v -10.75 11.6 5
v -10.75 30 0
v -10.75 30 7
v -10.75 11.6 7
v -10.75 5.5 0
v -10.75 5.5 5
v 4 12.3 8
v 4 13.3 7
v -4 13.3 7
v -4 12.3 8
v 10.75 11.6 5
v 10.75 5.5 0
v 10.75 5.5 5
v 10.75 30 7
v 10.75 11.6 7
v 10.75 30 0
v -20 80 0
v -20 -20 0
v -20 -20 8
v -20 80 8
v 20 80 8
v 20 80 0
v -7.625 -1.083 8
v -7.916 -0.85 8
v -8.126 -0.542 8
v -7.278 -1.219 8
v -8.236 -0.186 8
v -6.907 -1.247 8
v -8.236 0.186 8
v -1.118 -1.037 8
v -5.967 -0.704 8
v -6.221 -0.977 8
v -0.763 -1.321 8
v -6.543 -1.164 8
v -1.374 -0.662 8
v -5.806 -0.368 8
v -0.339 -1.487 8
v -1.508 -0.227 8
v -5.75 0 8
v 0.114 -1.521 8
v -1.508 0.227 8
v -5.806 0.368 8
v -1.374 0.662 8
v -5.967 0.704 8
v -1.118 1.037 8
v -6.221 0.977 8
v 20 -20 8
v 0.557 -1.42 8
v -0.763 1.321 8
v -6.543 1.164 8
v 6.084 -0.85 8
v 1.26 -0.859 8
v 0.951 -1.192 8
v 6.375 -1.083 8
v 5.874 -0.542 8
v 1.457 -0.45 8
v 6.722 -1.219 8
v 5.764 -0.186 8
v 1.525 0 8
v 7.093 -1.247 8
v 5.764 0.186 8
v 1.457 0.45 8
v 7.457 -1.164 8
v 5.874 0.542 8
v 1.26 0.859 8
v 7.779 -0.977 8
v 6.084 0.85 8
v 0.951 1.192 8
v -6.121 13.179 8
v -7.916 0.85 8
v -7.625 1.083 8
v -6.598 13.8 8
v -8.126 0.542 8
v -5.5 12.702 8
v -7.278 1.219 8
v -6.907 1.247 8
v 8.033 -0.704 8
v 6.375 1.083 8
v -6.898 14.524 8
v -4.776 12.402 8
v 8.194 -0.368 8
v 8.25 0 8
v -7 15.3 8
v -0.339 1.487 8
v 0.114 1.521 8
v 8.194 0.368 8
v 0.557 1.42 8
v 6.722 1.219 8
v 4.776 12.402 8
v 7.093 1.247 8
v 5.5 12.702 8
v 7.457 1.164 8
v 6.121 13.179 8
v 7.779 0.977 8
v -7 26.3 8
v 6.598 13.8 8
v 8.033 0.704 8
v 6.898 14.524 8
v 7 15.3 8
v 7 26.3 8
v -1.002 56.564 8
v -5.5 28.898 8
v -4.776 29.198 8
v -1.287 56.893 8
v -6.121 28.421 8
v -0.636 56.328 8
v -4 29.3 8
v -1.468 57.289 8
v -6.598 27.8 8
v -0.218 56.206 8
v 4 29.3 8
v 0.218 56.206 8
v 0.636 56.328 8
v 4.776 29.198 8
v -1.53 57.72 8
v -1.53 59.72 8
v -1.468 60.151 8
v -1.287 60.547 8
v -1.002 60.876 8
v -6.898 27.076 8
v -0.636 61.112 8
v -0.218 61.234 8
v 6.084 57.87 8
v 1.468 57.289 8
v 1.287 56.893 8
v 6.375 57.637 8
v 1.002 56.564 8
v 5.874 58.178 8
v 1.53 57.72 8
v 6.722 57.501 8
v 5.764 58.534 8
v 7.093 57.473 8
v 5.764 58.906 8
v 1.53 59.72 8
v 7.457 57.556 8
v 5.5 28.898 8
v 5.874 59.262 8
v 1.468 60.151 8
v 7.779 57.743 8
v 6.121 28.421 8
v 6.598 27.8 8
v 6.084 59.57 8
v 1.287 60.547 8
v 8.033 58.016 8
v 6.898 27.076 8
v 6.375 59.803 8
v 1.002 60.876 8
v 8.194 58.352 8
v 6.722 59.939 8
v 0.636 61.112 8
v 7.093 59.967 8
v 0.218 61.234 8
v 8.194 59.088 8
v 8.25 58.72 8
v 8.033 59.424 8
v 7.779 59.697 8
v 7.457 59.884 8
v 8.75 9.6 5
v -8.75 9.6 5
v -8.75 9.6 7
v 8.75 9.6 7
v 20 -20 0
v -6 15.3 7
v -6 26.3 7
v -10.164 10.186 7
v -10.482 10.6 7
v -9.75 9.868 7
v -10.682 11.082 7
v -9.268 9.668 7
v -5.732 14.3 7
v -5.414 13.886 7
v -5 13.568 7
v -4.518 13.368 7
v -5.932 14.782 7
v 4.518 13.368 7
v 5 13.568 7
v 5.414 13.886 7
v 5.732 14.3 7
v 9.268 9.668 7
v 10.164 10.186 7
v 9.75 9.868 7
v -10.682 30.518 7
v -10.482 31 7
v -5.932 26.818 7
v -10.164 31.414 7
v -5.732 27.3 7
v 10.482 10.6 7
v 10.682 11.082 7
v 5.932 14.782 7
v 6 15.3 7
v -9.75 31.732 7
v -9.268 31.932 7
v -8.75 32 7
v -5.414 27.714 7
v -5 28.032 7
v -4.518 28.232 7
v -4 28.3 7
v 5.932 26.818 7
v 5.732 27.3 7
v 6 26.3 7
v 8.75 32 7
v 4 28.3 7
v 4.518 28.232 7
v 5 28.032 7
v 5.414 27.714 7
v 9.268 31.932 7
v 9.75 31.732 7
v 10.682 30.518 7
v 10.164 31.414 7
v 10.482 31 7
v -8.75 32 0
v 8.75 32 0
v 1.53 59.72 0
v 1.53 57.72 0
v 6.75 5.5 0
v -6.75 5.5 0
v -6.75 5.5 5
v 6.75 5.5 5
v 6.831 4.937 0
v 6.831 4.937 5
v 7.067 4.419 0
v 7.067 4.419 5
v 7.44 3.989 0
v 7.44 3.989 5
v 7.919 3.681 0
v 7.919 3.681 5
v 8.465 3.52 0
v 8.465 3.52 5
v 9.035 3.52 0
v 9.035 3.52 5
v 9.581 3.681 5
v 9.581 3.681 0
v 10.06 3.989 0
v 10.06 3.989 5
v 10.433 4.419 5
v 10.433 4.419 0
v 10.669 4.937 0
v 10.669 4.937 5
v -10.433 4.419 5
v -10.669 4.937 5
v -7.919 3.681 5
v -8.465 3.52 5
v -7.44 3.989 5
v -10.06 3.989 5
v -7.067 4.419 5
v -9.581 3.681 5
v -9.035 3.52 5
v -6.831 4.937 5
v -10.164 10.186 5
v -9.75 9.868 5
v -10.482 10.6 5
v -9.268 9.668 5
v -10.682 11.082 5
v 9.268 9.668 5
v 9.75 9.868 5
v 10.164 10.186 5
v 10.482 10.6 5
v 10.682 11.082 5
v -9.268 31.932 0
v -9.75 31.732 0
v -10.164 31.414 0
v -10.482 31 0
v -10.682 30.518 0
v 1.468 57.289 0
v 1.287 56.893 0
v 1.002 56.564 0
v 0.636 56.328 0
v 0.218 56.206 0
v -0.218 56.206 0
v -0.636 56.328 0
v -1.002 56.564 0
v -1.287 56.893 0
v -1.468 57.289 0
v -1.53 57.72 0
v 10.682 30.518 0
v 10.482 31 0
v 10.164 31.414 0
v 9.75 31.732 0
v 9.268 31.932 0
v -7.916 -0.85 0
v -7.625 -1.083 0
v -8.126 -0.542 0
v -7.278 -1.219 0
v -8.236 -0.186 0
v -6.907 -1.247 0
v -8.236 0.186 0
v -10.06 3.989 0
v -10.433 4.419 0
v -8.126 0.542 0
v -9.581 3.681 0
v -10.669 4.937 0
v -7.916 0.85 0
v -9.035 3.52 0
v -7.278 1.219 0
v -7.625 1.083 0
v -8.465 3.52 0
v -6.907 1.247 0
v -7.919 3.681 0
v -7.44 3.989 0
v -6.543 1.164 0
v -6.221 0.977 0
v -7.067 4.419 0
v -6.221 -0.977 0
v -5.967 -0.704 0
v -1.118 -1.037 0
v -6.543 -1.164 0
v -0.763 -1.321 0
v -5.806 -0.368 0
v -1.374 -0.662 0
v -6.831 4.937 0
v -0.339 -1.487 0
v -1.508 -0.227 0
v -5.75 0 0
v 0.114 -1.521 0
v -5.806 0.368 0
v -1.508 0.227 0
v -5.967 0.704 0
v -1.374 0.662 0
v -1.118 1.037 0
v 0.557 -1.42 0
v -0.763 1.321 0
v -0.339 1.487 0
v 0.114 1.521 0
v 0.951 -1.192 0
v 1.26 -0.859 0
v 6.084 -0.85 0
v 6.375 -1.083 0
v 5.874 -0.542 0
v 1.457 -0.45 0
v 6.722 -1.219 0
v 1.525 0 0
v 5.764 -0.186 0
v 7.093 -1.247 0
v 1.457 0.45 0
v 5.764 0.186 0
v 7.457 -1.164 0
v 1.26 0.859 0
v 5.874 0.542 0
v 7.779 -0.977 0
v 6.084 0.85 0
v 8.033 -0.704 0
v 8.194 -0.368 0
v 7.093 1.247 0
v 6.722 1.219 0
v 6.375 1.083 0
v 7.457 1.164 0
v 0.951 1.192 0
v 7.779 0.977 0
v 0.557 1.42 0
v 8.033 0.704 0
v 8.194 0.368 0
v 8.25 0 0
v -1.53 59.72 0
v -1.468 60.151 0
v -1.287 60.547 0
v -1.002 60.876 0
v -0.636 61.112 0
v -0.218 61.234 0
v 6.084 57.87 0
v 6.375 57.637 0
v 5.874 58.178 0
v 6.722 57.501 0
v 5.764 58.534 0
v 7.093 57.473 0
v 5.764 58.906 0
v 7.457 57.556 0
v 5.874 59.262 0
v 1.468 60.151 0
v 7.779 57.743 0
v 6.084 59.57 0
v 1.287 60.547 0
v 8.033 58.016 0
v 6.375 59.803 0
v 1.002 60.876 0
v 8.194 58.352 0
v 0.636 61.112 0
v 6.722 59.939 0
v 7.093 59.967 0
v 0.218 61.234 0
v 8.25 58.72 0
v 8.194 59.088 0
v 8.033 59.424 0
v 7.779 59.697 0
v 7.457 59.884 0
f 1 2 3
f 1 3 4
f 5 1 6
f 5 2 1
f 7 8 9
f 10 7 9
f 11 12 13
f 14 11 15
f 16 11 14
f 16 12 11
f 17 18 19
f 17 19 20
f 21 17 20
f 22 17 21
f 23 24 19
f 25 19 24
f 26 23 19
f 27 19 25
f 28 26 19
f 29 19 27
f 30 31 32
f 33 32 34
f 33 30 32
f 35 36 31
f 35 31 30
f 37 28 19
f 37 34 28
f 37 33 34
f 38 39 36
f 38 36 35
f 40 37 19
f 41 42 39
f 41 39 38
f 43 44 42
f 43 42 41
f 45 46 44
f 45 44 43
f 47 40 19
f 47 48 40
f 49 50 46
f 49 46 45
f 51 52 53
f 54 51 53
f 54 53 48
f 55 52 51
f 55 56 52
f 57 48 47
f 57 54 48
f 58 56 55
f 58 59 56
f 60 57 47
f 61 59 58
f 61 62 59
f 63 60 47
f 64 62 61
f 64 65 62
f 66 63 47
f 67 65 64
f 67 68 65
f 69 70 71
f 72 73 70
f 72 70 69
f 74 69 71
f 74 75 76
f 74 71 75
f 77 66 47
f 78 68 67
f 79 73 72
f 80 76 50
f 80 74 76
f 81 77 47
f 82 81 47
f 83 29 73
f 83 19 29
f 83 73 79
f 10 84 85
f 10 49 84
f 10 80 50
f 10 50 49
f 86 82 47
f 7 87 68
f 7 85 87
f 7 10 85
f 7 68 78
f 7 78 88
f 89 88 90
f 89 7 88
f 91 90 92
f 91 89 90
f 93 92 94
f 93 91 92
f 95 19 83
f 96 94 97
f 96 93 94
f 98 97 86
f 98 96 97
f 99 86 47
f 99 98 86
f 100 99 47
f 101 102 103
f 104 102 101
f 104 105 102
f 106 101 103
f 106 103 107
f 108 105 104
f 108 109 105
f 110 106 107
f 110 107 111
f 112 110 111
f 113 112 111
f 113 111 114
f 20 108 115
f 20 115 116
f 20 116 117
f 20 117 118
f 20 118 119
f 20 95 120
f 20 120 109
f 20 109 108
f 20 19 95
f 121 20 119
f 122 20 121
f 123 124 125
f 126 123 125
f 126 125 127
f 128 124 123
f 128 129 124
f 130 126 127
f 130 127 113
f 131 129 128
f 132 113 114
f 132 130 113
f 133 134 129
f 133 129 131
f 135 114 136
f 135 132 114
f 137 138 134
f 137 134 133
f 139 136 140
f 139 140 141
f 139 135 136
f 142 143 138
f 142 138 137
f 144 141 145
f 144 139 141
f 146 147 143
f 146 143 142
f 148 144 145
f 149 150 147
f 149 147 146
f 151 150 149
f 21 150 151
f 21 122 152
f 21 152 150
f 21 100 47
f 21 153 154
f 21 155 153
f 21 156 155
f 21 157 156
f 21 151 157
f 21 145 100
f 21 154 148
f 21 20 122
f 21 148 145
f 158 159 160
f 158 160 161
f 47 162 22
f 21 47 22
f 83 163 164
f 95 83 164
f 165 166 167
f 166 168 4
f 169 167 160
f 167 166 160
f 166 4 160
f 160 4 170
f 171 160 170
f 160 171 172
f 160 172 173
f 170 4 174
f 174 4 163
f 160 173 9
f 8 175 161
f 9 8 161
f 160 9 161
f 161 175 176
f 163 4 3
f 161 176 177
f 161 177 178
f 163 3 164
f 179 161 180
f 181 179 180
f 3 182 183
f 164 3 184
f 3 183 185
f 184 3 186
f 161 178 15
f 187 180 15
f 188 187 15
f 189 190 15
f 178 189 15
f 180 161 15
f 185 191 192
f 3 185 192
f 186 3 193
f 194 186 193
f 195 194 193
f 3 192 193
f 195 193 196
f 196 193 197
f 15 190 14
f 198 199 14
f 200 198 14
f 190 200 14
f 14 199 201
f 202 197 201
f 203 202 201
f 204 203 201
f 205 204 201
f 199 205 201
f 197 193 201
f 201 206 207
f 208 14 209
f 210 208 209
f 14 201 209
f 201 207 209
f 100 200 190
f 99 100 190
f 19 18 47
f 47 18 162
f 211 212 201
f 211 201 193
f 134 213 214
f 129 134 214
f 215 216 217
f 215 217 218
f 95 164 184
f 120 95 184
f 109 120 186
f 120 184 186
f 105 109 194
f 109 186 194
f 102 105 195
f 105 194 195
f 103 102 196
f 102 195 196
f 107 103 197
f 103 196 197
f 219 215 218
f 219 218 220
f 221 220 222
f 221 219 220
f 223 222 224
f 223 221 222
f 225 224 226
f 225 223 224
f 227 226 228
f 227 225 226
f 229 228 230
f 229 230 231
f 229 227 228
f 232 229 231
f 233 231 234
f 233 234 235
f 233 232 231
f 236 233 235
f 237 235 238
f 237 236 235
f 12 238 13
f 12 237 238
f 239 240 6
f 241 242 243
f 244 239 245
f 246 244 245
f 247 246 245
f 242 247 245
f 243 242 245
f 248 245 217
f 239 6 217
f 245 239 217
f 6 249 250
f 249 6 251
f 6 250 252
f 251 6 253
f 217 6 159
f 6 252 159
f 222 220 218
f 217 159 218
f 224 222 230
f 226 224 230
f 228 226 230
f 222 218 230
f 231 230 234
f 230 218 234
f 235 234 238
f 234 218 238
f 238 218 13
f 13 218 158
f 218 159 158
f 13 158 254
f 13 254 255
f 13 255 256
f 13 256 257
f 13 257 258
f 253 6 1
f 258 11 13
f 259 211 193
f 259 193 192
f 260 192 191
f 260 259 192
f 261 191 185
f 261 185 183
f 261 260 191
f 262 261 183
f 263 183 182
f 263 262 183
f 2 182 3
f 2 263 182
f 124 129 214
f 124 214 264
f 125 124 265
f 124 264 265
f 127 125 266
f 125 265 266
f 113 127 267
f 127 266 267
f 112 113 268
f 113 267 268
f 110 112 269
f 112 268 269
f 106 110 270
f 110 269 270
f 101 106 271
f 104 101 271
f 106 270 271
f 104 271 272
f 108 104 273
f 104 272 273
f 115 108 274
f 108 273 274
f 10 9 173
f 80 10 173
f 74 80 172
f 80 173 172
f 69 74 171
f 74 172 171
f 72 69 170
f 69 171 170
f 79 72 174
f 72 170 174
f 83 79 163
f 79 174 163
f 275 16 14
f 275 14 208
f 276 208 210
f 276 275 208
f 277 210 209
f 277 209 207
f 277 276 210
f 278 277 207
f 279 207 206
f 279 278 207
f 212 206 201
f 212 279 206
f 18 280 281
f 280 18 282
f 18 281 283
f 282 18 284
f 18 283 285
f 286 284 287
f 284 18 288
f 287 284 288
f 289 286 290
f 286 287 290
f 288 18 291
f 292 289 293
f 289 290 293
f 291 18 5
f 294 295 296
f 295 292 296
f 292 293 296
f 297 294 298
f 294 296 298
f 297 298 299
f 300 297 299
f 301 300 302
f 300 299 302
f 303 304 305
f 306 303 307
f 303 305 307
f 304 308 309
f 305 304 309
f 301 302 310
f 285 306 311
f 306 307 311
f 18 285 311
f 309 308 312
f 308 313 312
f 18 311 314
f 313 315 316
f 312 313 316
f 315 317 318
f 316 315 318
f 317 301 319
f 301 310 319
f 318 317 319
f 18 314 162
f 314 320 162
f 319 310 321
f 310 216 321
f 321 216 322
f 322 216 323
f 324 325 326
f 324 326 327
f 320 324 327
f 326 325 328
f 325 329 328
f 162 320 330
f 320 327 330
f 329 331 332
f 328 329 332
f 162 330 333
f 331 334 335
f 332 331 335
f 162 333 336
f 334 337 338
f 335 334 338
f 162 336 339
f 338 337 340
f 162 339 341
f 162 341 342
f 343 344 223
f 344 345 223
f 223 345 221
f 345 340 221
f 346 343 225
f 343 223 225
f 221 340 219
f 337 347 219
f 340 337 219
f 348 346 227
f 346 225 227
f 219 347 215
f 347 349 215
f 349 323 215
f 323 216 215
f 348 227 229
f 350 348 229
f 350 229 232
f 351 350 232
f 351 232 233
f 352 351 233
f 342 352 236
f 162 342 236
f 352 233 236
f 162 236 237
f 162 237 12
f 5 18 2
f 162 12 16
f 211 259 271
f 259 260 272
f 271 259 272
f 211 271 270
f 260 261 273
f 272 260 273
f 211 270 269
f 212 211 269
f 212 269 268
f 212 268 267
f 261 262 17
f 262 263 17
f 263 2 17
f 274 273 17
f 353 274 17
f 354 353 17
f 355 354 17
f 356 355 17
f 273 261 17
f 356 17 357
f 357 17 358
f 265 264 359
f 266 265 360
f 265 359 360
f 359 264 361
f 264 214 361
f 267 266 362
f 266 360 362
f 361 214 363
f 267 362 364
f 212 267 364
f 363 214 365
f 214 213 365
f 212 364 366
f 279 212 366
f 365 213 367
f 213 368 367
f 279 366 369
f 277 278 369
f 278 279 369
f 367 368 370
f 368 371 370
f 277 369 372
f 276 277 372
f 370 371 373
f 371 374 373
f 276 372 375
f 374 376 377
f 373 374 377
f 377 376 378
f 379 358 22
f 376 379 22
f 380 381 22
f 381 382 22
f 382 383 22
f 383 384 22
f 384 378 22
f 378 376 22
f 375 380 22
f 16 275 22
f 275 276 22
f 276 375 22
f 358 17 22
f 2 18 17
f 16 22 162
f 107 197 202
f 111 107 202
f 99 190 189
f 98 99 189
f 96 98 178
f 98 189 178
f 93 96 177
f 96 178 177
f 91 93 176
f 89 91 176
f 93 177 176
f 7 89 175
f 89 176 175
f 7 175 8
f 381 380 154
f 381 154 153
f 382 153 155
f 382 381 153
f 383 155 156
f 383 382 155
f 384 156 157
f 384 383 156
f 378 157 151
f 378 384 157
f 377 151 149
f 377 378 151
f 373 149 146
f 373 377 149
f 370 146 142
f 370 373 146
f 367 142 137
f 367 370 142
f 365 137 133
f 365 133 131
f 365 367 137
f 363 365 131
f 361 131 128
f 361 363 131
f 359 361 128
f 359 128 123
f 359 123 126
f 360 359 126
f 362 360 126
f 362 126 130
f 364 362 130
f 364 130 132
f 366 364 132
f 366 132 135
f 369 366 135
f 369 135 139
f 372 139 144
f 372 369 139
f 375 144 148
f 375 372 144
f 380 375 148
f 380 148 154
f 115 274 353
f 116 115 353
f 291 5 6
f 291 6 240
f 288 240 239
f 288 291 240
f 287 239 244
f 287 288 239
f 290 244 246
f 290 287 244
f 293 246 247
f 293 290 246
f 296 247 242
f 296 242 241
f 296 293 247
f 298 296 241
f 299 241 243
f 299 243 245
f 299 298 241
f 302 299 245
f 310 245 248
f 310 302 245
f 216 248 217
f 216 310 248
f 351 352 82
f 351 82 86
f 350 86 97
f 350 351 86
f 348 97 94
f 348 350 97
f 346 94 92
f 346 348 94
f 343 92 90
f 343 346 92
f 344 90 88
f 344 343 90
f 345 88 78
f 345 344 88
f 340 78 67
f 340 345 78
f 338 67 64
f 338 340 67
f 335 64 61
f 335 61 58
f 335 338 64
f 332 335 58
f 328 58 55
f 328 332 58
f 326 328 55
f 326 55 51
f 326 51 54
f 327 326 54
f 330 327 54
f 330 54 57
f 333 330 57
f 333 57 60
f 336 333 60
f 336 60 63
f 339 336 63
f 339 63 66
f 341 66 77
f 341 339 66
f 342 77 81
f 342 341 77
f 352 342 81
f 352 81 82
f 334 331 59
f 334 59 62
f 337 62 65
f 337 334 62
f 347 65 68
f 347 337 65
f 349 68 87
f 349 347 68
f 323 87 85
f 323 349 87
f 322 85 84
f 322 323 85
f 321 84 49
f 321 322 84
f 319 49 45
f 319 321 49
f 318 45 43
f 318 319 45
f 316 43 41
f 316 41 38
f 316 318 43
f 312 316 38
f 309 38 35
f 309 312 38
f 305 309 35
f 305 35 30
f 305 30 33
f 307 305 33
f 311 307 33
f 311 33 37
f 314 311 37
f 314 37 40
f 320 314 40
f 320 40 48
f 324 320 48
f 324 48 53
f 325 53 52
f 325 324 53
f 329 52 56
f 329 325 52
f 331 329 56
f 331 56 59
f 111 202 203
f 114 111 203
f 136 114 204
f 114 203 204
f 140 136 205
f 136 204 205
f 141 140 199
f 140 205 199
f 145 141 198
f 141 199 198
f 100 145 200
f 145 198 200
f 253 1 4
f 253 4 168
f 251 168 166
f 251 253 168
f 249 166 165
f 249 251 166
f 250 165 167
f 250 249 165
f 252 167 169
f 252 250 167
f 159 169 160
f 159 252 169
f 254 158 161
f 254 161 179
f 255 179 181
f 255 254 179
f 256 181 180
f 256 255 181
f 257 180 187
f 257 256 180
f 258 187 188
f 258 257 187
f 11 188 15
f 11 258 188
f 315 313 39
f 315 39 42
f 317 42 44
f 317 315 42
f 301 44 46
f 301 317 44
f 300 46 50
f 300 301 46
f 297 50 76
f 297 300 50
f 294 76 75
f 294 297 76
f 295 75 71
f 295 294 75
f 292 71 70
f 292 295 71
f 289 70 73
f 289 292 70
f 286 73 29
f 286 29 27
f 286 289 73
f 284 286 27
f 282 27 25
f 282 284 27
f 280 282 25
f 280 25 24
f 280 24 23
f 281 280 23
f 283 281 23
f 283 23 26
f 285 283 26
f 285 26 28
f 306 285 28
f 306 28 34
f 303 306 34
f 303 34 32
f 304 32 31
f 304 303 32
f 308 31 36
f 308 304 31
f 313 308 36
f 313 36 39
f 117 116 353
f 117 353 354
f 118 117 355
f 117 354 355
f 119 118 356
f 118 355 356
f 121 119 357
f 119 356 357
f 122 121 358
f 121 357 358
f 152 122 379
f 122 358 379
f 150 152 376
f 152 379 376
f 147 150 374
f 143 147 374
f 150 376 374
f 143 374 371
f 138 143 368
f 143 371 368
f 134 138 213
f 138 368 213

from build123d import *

# Parameters (mm, degrees)
F0_W     = 40
F0_H     = 100
F0_R     = 1.25
F0_R_2   = 1.525
F1_DEPTH = 8
F2_DEPTH = 7
F3_DEPTH = 5
F4_SIZE  = 0.99999


# Not quite as in the source:
# - a fillet or chamfer is up to 0.001 mm smaller than in the source, because OpenCascade refuses the exact size


with BuildPart() as f1:
    # F0 (on Top) → F1 (new body)
    with BuildSketch(Plane.XY):
        with Locations((0, 30)):
            Rectangle(F0_W, F0_H)
        with Locations((-7, 0)):
            Circle(F0_R, mode=Mode.SUBTRACT)
        Circle(F0_R_2, mode=Mode.SUBTRACT)
        with Locations((7, 0)):
            Circle(F0_R, mode=Mode.SUBTRACT)
        with BuildLine():
            ThreePointArc((-10.75, 30), (-10.1642135624, 31.4142135624), (-8.75, 32))
            Line((-8.75, 32), (8.75, 32))
            ThreePointArc((8.75, 32), (10.1642135624, 31.4142135624), (10.75, 30))
            Line((10.75, 30), (10.75, 11.6))
            Line((10.75, 11.6), (10.75, 5.5))
            ThreePointArc((10.75, 5.5), (8.75, 3.5), (6.75, 5.5))
            Line((6.75, 5.5), (-6.75, 5.5))
            ThreePointArc((-6.75, 5.5), (-8.75, 3.5), (-10.75, 5.5))
            Line((-10.75, 5.5), (-10.75, 11.6))
            Line((-10.75, 11.6), (-10.75, 30))
        make_face(mode=Mode.SUBTRACT)
        with BuildLine():
            Line((-1.53, 57.72), (-1.53, 59.72))
            ThreePointArc((-1.53, 59.72), (0, 61.25), (1.53, 59.72))
            Line((1.53, 59.72), (1.53, 57.72))
            ThreePointArc((1.53, 57.72), (0, 56.19), (-1.53, 57.72))
        make_face(mode=Mode.SUBTRACT)
        with Locations((7, 58.72)):
            Circle(F0_R, mode=Mode.SUBTRACT)
        with BuildLine():
            Line((8.75, 32), (-8.75, 32))
            ThreePointArc((-8.75, 32), (-10.1642135624, 31.4142135624), (-10.75, 30))
            Line((-10.75, 30), (-10.75, 11.6))
            ThreePointArc((-10.75, 11.6), (-10.1642135624, 10.1857864376), (-8.75, 9.6))
            Line((-8.75, 9.6), (8.75, 9.6))
            ThreePointArc((8.75, 9.6), (10.1642135624, 10.1857864376), (10.75, 11.6))
            Line((10.75, 11.6), (10.75, 30))
            ThreePointArc((10.75, 30), (10.1642135624, 31.4142135624), (8.75, 32))
        make_face()
        with BuildLine():
            ThreePointArc((-6, 26.3), (-5.4142135624, 27.7142135624), (-4, 28.3))
            Line((-4, 28.3), (4, 28.3))
            ThreePointArc((4, 28.3), (5.4142135624, 27.7142135624), (6, 26.3))
            Line((6, 26.3), (6, 15.3))
            ThreePointArc((6, 15.3), (5.4142135624, 13.8857864376), (4, 13.3))
            Line((4, 13.3), (-4, 13.3))
            ThreePointArc((-4, 13.3), (-5.4142135624, 13.8857864376), (-6, 15.3))
            Line((-6, 15.3), (-6, 26.3))
        make_face(mode=Mode.SUBTRACT)
        with BuildLine():
            ThreePointArc((-8.75, 9.6), (-10.1642135624, 10.1857864376), (-10.75, 11.6))
            Line((-10.75, 11.6), (-10.75, 5.5))
            ThreePointArc((-10.75, 5.5), (-8.75, 3.5), (-6.75, 5.5))
            Line((-6.75, 5.5), (6.75, 5.5))
            ThreePointArc((6.75, 5.5), (8.75, 3.5), (10.75, 5.5))
            Line((10.75, 5.5), (10.75, 11.6))
            ThreePointArc((10.75, 11.6), (10.1642135624, 10.1857864376), (8.75, 9.6))
            Line((8.75, 9.6), (-8.75, 9.6))
        make_face()
    extrude(amount=F1_DEPTH)

    # F0 (on Top) → F2 (cut)
    with BuildSketch(Plane.XY):
        with BuildLine():
            Line((8.75, 32), (-8.75, 32))
            ThreePointArc((-8.75, 32), (-10.1642135624, 31.4142135624), (-10.75, 30))
            Line((-10.75, 30), (-10.75, 11.6))
            ThreePointArc((-10.75, 11.6), (-10.1642135624, 10.1857864376), (-8.75, 9.6))
            Line((-8.75, 9.6), (8.75, 9.6))
            ThreePointArc((8.75, 9.6), (10.1642135624, 10.1857864376), (10.75, 11.6))
            Line((10.75, 11.6), (10.75, 30))
            ThreePointArc((10.75, 30), (10.1642135624, 31.4142135624), (8.75, 32))
        make_face()
        with BuildLine():
            ThreePointArc((-6, 26.3), (-5.4142135624, 27.7142135624), (-4, 28.3))
            Line((-4, 28.3), (4, 28.3))
            ThreePointArc((4, 28.3), (5.4142135624, 27.7142135624), (6, 26.3))
            Line((6, 26.3), (6, 15.3))
            ThreePointArc((6, 15.3), (5.4142135624, 13.8857864376), (4, 13.3))
            Line((4, 13.3), (-4, 13.3))
            ThreePointArc((-4, 13.3), (-5.4142135624, 13.8857864376), (-6, 15.3))
            Line((-6, 15.3), (-6, 26.3))
        make_face(mode=Mode.SUBTRACT)
    extrude(amount=F2_DEPTH, mode=Mode.SUBTRACT)

    # F0 (on Top) → F3 (cut)
    with BuildSketch(Plane.XY):
        with BuildLine():
            ThreePointArc((-8.75, 9.6), (-10.1642135624, 10.1857864376), (-10.75, 11.6))
            Line((-10.75, 11.6), (-10.75, 5.5))
            ThreePointArc((-10.75, 5.5), (-8.75, 3.5), (-6.75, 5.5))
            Line((-6.75, 5.5), (6.75, 5.5))
            ThreePointArc((6.75, 5.5), (8.75, 3.5), (10.75, 5.5))
            Line((10.75, 5.5), (10.75, 11.6))
            ThreePointArc((10.75, 11.6), (10.1642135624, 10.1857864376), (8.75, 9.6))
            Line((8.75, 9.6), (-8.75, 9.6))
        make_face()
    extrude(amount=F3_DEPTH, mode=Mode.SUBTRACT)

    # F4 (size 1 in the source; OpenCascade refuses exactly that, so slightly less here)
    f4_edges = [f1.edges().sort_by_distance(p)[0] for p in [
        (6, 20.8, 8),
        (5.414214, 13.885786, 8),
        (0, 13.3, 8),
        (-5.414214, 13.885786, 8),
        (-6, 20.8, 8),
        (-5.414214, 27.714214, 8),
        (0, 28.3, 8),
        (5.414214, 27.714214, 8),
    ]]
    chamfer(f4_edges, length=F4_SIZE)


solid = f1.part
